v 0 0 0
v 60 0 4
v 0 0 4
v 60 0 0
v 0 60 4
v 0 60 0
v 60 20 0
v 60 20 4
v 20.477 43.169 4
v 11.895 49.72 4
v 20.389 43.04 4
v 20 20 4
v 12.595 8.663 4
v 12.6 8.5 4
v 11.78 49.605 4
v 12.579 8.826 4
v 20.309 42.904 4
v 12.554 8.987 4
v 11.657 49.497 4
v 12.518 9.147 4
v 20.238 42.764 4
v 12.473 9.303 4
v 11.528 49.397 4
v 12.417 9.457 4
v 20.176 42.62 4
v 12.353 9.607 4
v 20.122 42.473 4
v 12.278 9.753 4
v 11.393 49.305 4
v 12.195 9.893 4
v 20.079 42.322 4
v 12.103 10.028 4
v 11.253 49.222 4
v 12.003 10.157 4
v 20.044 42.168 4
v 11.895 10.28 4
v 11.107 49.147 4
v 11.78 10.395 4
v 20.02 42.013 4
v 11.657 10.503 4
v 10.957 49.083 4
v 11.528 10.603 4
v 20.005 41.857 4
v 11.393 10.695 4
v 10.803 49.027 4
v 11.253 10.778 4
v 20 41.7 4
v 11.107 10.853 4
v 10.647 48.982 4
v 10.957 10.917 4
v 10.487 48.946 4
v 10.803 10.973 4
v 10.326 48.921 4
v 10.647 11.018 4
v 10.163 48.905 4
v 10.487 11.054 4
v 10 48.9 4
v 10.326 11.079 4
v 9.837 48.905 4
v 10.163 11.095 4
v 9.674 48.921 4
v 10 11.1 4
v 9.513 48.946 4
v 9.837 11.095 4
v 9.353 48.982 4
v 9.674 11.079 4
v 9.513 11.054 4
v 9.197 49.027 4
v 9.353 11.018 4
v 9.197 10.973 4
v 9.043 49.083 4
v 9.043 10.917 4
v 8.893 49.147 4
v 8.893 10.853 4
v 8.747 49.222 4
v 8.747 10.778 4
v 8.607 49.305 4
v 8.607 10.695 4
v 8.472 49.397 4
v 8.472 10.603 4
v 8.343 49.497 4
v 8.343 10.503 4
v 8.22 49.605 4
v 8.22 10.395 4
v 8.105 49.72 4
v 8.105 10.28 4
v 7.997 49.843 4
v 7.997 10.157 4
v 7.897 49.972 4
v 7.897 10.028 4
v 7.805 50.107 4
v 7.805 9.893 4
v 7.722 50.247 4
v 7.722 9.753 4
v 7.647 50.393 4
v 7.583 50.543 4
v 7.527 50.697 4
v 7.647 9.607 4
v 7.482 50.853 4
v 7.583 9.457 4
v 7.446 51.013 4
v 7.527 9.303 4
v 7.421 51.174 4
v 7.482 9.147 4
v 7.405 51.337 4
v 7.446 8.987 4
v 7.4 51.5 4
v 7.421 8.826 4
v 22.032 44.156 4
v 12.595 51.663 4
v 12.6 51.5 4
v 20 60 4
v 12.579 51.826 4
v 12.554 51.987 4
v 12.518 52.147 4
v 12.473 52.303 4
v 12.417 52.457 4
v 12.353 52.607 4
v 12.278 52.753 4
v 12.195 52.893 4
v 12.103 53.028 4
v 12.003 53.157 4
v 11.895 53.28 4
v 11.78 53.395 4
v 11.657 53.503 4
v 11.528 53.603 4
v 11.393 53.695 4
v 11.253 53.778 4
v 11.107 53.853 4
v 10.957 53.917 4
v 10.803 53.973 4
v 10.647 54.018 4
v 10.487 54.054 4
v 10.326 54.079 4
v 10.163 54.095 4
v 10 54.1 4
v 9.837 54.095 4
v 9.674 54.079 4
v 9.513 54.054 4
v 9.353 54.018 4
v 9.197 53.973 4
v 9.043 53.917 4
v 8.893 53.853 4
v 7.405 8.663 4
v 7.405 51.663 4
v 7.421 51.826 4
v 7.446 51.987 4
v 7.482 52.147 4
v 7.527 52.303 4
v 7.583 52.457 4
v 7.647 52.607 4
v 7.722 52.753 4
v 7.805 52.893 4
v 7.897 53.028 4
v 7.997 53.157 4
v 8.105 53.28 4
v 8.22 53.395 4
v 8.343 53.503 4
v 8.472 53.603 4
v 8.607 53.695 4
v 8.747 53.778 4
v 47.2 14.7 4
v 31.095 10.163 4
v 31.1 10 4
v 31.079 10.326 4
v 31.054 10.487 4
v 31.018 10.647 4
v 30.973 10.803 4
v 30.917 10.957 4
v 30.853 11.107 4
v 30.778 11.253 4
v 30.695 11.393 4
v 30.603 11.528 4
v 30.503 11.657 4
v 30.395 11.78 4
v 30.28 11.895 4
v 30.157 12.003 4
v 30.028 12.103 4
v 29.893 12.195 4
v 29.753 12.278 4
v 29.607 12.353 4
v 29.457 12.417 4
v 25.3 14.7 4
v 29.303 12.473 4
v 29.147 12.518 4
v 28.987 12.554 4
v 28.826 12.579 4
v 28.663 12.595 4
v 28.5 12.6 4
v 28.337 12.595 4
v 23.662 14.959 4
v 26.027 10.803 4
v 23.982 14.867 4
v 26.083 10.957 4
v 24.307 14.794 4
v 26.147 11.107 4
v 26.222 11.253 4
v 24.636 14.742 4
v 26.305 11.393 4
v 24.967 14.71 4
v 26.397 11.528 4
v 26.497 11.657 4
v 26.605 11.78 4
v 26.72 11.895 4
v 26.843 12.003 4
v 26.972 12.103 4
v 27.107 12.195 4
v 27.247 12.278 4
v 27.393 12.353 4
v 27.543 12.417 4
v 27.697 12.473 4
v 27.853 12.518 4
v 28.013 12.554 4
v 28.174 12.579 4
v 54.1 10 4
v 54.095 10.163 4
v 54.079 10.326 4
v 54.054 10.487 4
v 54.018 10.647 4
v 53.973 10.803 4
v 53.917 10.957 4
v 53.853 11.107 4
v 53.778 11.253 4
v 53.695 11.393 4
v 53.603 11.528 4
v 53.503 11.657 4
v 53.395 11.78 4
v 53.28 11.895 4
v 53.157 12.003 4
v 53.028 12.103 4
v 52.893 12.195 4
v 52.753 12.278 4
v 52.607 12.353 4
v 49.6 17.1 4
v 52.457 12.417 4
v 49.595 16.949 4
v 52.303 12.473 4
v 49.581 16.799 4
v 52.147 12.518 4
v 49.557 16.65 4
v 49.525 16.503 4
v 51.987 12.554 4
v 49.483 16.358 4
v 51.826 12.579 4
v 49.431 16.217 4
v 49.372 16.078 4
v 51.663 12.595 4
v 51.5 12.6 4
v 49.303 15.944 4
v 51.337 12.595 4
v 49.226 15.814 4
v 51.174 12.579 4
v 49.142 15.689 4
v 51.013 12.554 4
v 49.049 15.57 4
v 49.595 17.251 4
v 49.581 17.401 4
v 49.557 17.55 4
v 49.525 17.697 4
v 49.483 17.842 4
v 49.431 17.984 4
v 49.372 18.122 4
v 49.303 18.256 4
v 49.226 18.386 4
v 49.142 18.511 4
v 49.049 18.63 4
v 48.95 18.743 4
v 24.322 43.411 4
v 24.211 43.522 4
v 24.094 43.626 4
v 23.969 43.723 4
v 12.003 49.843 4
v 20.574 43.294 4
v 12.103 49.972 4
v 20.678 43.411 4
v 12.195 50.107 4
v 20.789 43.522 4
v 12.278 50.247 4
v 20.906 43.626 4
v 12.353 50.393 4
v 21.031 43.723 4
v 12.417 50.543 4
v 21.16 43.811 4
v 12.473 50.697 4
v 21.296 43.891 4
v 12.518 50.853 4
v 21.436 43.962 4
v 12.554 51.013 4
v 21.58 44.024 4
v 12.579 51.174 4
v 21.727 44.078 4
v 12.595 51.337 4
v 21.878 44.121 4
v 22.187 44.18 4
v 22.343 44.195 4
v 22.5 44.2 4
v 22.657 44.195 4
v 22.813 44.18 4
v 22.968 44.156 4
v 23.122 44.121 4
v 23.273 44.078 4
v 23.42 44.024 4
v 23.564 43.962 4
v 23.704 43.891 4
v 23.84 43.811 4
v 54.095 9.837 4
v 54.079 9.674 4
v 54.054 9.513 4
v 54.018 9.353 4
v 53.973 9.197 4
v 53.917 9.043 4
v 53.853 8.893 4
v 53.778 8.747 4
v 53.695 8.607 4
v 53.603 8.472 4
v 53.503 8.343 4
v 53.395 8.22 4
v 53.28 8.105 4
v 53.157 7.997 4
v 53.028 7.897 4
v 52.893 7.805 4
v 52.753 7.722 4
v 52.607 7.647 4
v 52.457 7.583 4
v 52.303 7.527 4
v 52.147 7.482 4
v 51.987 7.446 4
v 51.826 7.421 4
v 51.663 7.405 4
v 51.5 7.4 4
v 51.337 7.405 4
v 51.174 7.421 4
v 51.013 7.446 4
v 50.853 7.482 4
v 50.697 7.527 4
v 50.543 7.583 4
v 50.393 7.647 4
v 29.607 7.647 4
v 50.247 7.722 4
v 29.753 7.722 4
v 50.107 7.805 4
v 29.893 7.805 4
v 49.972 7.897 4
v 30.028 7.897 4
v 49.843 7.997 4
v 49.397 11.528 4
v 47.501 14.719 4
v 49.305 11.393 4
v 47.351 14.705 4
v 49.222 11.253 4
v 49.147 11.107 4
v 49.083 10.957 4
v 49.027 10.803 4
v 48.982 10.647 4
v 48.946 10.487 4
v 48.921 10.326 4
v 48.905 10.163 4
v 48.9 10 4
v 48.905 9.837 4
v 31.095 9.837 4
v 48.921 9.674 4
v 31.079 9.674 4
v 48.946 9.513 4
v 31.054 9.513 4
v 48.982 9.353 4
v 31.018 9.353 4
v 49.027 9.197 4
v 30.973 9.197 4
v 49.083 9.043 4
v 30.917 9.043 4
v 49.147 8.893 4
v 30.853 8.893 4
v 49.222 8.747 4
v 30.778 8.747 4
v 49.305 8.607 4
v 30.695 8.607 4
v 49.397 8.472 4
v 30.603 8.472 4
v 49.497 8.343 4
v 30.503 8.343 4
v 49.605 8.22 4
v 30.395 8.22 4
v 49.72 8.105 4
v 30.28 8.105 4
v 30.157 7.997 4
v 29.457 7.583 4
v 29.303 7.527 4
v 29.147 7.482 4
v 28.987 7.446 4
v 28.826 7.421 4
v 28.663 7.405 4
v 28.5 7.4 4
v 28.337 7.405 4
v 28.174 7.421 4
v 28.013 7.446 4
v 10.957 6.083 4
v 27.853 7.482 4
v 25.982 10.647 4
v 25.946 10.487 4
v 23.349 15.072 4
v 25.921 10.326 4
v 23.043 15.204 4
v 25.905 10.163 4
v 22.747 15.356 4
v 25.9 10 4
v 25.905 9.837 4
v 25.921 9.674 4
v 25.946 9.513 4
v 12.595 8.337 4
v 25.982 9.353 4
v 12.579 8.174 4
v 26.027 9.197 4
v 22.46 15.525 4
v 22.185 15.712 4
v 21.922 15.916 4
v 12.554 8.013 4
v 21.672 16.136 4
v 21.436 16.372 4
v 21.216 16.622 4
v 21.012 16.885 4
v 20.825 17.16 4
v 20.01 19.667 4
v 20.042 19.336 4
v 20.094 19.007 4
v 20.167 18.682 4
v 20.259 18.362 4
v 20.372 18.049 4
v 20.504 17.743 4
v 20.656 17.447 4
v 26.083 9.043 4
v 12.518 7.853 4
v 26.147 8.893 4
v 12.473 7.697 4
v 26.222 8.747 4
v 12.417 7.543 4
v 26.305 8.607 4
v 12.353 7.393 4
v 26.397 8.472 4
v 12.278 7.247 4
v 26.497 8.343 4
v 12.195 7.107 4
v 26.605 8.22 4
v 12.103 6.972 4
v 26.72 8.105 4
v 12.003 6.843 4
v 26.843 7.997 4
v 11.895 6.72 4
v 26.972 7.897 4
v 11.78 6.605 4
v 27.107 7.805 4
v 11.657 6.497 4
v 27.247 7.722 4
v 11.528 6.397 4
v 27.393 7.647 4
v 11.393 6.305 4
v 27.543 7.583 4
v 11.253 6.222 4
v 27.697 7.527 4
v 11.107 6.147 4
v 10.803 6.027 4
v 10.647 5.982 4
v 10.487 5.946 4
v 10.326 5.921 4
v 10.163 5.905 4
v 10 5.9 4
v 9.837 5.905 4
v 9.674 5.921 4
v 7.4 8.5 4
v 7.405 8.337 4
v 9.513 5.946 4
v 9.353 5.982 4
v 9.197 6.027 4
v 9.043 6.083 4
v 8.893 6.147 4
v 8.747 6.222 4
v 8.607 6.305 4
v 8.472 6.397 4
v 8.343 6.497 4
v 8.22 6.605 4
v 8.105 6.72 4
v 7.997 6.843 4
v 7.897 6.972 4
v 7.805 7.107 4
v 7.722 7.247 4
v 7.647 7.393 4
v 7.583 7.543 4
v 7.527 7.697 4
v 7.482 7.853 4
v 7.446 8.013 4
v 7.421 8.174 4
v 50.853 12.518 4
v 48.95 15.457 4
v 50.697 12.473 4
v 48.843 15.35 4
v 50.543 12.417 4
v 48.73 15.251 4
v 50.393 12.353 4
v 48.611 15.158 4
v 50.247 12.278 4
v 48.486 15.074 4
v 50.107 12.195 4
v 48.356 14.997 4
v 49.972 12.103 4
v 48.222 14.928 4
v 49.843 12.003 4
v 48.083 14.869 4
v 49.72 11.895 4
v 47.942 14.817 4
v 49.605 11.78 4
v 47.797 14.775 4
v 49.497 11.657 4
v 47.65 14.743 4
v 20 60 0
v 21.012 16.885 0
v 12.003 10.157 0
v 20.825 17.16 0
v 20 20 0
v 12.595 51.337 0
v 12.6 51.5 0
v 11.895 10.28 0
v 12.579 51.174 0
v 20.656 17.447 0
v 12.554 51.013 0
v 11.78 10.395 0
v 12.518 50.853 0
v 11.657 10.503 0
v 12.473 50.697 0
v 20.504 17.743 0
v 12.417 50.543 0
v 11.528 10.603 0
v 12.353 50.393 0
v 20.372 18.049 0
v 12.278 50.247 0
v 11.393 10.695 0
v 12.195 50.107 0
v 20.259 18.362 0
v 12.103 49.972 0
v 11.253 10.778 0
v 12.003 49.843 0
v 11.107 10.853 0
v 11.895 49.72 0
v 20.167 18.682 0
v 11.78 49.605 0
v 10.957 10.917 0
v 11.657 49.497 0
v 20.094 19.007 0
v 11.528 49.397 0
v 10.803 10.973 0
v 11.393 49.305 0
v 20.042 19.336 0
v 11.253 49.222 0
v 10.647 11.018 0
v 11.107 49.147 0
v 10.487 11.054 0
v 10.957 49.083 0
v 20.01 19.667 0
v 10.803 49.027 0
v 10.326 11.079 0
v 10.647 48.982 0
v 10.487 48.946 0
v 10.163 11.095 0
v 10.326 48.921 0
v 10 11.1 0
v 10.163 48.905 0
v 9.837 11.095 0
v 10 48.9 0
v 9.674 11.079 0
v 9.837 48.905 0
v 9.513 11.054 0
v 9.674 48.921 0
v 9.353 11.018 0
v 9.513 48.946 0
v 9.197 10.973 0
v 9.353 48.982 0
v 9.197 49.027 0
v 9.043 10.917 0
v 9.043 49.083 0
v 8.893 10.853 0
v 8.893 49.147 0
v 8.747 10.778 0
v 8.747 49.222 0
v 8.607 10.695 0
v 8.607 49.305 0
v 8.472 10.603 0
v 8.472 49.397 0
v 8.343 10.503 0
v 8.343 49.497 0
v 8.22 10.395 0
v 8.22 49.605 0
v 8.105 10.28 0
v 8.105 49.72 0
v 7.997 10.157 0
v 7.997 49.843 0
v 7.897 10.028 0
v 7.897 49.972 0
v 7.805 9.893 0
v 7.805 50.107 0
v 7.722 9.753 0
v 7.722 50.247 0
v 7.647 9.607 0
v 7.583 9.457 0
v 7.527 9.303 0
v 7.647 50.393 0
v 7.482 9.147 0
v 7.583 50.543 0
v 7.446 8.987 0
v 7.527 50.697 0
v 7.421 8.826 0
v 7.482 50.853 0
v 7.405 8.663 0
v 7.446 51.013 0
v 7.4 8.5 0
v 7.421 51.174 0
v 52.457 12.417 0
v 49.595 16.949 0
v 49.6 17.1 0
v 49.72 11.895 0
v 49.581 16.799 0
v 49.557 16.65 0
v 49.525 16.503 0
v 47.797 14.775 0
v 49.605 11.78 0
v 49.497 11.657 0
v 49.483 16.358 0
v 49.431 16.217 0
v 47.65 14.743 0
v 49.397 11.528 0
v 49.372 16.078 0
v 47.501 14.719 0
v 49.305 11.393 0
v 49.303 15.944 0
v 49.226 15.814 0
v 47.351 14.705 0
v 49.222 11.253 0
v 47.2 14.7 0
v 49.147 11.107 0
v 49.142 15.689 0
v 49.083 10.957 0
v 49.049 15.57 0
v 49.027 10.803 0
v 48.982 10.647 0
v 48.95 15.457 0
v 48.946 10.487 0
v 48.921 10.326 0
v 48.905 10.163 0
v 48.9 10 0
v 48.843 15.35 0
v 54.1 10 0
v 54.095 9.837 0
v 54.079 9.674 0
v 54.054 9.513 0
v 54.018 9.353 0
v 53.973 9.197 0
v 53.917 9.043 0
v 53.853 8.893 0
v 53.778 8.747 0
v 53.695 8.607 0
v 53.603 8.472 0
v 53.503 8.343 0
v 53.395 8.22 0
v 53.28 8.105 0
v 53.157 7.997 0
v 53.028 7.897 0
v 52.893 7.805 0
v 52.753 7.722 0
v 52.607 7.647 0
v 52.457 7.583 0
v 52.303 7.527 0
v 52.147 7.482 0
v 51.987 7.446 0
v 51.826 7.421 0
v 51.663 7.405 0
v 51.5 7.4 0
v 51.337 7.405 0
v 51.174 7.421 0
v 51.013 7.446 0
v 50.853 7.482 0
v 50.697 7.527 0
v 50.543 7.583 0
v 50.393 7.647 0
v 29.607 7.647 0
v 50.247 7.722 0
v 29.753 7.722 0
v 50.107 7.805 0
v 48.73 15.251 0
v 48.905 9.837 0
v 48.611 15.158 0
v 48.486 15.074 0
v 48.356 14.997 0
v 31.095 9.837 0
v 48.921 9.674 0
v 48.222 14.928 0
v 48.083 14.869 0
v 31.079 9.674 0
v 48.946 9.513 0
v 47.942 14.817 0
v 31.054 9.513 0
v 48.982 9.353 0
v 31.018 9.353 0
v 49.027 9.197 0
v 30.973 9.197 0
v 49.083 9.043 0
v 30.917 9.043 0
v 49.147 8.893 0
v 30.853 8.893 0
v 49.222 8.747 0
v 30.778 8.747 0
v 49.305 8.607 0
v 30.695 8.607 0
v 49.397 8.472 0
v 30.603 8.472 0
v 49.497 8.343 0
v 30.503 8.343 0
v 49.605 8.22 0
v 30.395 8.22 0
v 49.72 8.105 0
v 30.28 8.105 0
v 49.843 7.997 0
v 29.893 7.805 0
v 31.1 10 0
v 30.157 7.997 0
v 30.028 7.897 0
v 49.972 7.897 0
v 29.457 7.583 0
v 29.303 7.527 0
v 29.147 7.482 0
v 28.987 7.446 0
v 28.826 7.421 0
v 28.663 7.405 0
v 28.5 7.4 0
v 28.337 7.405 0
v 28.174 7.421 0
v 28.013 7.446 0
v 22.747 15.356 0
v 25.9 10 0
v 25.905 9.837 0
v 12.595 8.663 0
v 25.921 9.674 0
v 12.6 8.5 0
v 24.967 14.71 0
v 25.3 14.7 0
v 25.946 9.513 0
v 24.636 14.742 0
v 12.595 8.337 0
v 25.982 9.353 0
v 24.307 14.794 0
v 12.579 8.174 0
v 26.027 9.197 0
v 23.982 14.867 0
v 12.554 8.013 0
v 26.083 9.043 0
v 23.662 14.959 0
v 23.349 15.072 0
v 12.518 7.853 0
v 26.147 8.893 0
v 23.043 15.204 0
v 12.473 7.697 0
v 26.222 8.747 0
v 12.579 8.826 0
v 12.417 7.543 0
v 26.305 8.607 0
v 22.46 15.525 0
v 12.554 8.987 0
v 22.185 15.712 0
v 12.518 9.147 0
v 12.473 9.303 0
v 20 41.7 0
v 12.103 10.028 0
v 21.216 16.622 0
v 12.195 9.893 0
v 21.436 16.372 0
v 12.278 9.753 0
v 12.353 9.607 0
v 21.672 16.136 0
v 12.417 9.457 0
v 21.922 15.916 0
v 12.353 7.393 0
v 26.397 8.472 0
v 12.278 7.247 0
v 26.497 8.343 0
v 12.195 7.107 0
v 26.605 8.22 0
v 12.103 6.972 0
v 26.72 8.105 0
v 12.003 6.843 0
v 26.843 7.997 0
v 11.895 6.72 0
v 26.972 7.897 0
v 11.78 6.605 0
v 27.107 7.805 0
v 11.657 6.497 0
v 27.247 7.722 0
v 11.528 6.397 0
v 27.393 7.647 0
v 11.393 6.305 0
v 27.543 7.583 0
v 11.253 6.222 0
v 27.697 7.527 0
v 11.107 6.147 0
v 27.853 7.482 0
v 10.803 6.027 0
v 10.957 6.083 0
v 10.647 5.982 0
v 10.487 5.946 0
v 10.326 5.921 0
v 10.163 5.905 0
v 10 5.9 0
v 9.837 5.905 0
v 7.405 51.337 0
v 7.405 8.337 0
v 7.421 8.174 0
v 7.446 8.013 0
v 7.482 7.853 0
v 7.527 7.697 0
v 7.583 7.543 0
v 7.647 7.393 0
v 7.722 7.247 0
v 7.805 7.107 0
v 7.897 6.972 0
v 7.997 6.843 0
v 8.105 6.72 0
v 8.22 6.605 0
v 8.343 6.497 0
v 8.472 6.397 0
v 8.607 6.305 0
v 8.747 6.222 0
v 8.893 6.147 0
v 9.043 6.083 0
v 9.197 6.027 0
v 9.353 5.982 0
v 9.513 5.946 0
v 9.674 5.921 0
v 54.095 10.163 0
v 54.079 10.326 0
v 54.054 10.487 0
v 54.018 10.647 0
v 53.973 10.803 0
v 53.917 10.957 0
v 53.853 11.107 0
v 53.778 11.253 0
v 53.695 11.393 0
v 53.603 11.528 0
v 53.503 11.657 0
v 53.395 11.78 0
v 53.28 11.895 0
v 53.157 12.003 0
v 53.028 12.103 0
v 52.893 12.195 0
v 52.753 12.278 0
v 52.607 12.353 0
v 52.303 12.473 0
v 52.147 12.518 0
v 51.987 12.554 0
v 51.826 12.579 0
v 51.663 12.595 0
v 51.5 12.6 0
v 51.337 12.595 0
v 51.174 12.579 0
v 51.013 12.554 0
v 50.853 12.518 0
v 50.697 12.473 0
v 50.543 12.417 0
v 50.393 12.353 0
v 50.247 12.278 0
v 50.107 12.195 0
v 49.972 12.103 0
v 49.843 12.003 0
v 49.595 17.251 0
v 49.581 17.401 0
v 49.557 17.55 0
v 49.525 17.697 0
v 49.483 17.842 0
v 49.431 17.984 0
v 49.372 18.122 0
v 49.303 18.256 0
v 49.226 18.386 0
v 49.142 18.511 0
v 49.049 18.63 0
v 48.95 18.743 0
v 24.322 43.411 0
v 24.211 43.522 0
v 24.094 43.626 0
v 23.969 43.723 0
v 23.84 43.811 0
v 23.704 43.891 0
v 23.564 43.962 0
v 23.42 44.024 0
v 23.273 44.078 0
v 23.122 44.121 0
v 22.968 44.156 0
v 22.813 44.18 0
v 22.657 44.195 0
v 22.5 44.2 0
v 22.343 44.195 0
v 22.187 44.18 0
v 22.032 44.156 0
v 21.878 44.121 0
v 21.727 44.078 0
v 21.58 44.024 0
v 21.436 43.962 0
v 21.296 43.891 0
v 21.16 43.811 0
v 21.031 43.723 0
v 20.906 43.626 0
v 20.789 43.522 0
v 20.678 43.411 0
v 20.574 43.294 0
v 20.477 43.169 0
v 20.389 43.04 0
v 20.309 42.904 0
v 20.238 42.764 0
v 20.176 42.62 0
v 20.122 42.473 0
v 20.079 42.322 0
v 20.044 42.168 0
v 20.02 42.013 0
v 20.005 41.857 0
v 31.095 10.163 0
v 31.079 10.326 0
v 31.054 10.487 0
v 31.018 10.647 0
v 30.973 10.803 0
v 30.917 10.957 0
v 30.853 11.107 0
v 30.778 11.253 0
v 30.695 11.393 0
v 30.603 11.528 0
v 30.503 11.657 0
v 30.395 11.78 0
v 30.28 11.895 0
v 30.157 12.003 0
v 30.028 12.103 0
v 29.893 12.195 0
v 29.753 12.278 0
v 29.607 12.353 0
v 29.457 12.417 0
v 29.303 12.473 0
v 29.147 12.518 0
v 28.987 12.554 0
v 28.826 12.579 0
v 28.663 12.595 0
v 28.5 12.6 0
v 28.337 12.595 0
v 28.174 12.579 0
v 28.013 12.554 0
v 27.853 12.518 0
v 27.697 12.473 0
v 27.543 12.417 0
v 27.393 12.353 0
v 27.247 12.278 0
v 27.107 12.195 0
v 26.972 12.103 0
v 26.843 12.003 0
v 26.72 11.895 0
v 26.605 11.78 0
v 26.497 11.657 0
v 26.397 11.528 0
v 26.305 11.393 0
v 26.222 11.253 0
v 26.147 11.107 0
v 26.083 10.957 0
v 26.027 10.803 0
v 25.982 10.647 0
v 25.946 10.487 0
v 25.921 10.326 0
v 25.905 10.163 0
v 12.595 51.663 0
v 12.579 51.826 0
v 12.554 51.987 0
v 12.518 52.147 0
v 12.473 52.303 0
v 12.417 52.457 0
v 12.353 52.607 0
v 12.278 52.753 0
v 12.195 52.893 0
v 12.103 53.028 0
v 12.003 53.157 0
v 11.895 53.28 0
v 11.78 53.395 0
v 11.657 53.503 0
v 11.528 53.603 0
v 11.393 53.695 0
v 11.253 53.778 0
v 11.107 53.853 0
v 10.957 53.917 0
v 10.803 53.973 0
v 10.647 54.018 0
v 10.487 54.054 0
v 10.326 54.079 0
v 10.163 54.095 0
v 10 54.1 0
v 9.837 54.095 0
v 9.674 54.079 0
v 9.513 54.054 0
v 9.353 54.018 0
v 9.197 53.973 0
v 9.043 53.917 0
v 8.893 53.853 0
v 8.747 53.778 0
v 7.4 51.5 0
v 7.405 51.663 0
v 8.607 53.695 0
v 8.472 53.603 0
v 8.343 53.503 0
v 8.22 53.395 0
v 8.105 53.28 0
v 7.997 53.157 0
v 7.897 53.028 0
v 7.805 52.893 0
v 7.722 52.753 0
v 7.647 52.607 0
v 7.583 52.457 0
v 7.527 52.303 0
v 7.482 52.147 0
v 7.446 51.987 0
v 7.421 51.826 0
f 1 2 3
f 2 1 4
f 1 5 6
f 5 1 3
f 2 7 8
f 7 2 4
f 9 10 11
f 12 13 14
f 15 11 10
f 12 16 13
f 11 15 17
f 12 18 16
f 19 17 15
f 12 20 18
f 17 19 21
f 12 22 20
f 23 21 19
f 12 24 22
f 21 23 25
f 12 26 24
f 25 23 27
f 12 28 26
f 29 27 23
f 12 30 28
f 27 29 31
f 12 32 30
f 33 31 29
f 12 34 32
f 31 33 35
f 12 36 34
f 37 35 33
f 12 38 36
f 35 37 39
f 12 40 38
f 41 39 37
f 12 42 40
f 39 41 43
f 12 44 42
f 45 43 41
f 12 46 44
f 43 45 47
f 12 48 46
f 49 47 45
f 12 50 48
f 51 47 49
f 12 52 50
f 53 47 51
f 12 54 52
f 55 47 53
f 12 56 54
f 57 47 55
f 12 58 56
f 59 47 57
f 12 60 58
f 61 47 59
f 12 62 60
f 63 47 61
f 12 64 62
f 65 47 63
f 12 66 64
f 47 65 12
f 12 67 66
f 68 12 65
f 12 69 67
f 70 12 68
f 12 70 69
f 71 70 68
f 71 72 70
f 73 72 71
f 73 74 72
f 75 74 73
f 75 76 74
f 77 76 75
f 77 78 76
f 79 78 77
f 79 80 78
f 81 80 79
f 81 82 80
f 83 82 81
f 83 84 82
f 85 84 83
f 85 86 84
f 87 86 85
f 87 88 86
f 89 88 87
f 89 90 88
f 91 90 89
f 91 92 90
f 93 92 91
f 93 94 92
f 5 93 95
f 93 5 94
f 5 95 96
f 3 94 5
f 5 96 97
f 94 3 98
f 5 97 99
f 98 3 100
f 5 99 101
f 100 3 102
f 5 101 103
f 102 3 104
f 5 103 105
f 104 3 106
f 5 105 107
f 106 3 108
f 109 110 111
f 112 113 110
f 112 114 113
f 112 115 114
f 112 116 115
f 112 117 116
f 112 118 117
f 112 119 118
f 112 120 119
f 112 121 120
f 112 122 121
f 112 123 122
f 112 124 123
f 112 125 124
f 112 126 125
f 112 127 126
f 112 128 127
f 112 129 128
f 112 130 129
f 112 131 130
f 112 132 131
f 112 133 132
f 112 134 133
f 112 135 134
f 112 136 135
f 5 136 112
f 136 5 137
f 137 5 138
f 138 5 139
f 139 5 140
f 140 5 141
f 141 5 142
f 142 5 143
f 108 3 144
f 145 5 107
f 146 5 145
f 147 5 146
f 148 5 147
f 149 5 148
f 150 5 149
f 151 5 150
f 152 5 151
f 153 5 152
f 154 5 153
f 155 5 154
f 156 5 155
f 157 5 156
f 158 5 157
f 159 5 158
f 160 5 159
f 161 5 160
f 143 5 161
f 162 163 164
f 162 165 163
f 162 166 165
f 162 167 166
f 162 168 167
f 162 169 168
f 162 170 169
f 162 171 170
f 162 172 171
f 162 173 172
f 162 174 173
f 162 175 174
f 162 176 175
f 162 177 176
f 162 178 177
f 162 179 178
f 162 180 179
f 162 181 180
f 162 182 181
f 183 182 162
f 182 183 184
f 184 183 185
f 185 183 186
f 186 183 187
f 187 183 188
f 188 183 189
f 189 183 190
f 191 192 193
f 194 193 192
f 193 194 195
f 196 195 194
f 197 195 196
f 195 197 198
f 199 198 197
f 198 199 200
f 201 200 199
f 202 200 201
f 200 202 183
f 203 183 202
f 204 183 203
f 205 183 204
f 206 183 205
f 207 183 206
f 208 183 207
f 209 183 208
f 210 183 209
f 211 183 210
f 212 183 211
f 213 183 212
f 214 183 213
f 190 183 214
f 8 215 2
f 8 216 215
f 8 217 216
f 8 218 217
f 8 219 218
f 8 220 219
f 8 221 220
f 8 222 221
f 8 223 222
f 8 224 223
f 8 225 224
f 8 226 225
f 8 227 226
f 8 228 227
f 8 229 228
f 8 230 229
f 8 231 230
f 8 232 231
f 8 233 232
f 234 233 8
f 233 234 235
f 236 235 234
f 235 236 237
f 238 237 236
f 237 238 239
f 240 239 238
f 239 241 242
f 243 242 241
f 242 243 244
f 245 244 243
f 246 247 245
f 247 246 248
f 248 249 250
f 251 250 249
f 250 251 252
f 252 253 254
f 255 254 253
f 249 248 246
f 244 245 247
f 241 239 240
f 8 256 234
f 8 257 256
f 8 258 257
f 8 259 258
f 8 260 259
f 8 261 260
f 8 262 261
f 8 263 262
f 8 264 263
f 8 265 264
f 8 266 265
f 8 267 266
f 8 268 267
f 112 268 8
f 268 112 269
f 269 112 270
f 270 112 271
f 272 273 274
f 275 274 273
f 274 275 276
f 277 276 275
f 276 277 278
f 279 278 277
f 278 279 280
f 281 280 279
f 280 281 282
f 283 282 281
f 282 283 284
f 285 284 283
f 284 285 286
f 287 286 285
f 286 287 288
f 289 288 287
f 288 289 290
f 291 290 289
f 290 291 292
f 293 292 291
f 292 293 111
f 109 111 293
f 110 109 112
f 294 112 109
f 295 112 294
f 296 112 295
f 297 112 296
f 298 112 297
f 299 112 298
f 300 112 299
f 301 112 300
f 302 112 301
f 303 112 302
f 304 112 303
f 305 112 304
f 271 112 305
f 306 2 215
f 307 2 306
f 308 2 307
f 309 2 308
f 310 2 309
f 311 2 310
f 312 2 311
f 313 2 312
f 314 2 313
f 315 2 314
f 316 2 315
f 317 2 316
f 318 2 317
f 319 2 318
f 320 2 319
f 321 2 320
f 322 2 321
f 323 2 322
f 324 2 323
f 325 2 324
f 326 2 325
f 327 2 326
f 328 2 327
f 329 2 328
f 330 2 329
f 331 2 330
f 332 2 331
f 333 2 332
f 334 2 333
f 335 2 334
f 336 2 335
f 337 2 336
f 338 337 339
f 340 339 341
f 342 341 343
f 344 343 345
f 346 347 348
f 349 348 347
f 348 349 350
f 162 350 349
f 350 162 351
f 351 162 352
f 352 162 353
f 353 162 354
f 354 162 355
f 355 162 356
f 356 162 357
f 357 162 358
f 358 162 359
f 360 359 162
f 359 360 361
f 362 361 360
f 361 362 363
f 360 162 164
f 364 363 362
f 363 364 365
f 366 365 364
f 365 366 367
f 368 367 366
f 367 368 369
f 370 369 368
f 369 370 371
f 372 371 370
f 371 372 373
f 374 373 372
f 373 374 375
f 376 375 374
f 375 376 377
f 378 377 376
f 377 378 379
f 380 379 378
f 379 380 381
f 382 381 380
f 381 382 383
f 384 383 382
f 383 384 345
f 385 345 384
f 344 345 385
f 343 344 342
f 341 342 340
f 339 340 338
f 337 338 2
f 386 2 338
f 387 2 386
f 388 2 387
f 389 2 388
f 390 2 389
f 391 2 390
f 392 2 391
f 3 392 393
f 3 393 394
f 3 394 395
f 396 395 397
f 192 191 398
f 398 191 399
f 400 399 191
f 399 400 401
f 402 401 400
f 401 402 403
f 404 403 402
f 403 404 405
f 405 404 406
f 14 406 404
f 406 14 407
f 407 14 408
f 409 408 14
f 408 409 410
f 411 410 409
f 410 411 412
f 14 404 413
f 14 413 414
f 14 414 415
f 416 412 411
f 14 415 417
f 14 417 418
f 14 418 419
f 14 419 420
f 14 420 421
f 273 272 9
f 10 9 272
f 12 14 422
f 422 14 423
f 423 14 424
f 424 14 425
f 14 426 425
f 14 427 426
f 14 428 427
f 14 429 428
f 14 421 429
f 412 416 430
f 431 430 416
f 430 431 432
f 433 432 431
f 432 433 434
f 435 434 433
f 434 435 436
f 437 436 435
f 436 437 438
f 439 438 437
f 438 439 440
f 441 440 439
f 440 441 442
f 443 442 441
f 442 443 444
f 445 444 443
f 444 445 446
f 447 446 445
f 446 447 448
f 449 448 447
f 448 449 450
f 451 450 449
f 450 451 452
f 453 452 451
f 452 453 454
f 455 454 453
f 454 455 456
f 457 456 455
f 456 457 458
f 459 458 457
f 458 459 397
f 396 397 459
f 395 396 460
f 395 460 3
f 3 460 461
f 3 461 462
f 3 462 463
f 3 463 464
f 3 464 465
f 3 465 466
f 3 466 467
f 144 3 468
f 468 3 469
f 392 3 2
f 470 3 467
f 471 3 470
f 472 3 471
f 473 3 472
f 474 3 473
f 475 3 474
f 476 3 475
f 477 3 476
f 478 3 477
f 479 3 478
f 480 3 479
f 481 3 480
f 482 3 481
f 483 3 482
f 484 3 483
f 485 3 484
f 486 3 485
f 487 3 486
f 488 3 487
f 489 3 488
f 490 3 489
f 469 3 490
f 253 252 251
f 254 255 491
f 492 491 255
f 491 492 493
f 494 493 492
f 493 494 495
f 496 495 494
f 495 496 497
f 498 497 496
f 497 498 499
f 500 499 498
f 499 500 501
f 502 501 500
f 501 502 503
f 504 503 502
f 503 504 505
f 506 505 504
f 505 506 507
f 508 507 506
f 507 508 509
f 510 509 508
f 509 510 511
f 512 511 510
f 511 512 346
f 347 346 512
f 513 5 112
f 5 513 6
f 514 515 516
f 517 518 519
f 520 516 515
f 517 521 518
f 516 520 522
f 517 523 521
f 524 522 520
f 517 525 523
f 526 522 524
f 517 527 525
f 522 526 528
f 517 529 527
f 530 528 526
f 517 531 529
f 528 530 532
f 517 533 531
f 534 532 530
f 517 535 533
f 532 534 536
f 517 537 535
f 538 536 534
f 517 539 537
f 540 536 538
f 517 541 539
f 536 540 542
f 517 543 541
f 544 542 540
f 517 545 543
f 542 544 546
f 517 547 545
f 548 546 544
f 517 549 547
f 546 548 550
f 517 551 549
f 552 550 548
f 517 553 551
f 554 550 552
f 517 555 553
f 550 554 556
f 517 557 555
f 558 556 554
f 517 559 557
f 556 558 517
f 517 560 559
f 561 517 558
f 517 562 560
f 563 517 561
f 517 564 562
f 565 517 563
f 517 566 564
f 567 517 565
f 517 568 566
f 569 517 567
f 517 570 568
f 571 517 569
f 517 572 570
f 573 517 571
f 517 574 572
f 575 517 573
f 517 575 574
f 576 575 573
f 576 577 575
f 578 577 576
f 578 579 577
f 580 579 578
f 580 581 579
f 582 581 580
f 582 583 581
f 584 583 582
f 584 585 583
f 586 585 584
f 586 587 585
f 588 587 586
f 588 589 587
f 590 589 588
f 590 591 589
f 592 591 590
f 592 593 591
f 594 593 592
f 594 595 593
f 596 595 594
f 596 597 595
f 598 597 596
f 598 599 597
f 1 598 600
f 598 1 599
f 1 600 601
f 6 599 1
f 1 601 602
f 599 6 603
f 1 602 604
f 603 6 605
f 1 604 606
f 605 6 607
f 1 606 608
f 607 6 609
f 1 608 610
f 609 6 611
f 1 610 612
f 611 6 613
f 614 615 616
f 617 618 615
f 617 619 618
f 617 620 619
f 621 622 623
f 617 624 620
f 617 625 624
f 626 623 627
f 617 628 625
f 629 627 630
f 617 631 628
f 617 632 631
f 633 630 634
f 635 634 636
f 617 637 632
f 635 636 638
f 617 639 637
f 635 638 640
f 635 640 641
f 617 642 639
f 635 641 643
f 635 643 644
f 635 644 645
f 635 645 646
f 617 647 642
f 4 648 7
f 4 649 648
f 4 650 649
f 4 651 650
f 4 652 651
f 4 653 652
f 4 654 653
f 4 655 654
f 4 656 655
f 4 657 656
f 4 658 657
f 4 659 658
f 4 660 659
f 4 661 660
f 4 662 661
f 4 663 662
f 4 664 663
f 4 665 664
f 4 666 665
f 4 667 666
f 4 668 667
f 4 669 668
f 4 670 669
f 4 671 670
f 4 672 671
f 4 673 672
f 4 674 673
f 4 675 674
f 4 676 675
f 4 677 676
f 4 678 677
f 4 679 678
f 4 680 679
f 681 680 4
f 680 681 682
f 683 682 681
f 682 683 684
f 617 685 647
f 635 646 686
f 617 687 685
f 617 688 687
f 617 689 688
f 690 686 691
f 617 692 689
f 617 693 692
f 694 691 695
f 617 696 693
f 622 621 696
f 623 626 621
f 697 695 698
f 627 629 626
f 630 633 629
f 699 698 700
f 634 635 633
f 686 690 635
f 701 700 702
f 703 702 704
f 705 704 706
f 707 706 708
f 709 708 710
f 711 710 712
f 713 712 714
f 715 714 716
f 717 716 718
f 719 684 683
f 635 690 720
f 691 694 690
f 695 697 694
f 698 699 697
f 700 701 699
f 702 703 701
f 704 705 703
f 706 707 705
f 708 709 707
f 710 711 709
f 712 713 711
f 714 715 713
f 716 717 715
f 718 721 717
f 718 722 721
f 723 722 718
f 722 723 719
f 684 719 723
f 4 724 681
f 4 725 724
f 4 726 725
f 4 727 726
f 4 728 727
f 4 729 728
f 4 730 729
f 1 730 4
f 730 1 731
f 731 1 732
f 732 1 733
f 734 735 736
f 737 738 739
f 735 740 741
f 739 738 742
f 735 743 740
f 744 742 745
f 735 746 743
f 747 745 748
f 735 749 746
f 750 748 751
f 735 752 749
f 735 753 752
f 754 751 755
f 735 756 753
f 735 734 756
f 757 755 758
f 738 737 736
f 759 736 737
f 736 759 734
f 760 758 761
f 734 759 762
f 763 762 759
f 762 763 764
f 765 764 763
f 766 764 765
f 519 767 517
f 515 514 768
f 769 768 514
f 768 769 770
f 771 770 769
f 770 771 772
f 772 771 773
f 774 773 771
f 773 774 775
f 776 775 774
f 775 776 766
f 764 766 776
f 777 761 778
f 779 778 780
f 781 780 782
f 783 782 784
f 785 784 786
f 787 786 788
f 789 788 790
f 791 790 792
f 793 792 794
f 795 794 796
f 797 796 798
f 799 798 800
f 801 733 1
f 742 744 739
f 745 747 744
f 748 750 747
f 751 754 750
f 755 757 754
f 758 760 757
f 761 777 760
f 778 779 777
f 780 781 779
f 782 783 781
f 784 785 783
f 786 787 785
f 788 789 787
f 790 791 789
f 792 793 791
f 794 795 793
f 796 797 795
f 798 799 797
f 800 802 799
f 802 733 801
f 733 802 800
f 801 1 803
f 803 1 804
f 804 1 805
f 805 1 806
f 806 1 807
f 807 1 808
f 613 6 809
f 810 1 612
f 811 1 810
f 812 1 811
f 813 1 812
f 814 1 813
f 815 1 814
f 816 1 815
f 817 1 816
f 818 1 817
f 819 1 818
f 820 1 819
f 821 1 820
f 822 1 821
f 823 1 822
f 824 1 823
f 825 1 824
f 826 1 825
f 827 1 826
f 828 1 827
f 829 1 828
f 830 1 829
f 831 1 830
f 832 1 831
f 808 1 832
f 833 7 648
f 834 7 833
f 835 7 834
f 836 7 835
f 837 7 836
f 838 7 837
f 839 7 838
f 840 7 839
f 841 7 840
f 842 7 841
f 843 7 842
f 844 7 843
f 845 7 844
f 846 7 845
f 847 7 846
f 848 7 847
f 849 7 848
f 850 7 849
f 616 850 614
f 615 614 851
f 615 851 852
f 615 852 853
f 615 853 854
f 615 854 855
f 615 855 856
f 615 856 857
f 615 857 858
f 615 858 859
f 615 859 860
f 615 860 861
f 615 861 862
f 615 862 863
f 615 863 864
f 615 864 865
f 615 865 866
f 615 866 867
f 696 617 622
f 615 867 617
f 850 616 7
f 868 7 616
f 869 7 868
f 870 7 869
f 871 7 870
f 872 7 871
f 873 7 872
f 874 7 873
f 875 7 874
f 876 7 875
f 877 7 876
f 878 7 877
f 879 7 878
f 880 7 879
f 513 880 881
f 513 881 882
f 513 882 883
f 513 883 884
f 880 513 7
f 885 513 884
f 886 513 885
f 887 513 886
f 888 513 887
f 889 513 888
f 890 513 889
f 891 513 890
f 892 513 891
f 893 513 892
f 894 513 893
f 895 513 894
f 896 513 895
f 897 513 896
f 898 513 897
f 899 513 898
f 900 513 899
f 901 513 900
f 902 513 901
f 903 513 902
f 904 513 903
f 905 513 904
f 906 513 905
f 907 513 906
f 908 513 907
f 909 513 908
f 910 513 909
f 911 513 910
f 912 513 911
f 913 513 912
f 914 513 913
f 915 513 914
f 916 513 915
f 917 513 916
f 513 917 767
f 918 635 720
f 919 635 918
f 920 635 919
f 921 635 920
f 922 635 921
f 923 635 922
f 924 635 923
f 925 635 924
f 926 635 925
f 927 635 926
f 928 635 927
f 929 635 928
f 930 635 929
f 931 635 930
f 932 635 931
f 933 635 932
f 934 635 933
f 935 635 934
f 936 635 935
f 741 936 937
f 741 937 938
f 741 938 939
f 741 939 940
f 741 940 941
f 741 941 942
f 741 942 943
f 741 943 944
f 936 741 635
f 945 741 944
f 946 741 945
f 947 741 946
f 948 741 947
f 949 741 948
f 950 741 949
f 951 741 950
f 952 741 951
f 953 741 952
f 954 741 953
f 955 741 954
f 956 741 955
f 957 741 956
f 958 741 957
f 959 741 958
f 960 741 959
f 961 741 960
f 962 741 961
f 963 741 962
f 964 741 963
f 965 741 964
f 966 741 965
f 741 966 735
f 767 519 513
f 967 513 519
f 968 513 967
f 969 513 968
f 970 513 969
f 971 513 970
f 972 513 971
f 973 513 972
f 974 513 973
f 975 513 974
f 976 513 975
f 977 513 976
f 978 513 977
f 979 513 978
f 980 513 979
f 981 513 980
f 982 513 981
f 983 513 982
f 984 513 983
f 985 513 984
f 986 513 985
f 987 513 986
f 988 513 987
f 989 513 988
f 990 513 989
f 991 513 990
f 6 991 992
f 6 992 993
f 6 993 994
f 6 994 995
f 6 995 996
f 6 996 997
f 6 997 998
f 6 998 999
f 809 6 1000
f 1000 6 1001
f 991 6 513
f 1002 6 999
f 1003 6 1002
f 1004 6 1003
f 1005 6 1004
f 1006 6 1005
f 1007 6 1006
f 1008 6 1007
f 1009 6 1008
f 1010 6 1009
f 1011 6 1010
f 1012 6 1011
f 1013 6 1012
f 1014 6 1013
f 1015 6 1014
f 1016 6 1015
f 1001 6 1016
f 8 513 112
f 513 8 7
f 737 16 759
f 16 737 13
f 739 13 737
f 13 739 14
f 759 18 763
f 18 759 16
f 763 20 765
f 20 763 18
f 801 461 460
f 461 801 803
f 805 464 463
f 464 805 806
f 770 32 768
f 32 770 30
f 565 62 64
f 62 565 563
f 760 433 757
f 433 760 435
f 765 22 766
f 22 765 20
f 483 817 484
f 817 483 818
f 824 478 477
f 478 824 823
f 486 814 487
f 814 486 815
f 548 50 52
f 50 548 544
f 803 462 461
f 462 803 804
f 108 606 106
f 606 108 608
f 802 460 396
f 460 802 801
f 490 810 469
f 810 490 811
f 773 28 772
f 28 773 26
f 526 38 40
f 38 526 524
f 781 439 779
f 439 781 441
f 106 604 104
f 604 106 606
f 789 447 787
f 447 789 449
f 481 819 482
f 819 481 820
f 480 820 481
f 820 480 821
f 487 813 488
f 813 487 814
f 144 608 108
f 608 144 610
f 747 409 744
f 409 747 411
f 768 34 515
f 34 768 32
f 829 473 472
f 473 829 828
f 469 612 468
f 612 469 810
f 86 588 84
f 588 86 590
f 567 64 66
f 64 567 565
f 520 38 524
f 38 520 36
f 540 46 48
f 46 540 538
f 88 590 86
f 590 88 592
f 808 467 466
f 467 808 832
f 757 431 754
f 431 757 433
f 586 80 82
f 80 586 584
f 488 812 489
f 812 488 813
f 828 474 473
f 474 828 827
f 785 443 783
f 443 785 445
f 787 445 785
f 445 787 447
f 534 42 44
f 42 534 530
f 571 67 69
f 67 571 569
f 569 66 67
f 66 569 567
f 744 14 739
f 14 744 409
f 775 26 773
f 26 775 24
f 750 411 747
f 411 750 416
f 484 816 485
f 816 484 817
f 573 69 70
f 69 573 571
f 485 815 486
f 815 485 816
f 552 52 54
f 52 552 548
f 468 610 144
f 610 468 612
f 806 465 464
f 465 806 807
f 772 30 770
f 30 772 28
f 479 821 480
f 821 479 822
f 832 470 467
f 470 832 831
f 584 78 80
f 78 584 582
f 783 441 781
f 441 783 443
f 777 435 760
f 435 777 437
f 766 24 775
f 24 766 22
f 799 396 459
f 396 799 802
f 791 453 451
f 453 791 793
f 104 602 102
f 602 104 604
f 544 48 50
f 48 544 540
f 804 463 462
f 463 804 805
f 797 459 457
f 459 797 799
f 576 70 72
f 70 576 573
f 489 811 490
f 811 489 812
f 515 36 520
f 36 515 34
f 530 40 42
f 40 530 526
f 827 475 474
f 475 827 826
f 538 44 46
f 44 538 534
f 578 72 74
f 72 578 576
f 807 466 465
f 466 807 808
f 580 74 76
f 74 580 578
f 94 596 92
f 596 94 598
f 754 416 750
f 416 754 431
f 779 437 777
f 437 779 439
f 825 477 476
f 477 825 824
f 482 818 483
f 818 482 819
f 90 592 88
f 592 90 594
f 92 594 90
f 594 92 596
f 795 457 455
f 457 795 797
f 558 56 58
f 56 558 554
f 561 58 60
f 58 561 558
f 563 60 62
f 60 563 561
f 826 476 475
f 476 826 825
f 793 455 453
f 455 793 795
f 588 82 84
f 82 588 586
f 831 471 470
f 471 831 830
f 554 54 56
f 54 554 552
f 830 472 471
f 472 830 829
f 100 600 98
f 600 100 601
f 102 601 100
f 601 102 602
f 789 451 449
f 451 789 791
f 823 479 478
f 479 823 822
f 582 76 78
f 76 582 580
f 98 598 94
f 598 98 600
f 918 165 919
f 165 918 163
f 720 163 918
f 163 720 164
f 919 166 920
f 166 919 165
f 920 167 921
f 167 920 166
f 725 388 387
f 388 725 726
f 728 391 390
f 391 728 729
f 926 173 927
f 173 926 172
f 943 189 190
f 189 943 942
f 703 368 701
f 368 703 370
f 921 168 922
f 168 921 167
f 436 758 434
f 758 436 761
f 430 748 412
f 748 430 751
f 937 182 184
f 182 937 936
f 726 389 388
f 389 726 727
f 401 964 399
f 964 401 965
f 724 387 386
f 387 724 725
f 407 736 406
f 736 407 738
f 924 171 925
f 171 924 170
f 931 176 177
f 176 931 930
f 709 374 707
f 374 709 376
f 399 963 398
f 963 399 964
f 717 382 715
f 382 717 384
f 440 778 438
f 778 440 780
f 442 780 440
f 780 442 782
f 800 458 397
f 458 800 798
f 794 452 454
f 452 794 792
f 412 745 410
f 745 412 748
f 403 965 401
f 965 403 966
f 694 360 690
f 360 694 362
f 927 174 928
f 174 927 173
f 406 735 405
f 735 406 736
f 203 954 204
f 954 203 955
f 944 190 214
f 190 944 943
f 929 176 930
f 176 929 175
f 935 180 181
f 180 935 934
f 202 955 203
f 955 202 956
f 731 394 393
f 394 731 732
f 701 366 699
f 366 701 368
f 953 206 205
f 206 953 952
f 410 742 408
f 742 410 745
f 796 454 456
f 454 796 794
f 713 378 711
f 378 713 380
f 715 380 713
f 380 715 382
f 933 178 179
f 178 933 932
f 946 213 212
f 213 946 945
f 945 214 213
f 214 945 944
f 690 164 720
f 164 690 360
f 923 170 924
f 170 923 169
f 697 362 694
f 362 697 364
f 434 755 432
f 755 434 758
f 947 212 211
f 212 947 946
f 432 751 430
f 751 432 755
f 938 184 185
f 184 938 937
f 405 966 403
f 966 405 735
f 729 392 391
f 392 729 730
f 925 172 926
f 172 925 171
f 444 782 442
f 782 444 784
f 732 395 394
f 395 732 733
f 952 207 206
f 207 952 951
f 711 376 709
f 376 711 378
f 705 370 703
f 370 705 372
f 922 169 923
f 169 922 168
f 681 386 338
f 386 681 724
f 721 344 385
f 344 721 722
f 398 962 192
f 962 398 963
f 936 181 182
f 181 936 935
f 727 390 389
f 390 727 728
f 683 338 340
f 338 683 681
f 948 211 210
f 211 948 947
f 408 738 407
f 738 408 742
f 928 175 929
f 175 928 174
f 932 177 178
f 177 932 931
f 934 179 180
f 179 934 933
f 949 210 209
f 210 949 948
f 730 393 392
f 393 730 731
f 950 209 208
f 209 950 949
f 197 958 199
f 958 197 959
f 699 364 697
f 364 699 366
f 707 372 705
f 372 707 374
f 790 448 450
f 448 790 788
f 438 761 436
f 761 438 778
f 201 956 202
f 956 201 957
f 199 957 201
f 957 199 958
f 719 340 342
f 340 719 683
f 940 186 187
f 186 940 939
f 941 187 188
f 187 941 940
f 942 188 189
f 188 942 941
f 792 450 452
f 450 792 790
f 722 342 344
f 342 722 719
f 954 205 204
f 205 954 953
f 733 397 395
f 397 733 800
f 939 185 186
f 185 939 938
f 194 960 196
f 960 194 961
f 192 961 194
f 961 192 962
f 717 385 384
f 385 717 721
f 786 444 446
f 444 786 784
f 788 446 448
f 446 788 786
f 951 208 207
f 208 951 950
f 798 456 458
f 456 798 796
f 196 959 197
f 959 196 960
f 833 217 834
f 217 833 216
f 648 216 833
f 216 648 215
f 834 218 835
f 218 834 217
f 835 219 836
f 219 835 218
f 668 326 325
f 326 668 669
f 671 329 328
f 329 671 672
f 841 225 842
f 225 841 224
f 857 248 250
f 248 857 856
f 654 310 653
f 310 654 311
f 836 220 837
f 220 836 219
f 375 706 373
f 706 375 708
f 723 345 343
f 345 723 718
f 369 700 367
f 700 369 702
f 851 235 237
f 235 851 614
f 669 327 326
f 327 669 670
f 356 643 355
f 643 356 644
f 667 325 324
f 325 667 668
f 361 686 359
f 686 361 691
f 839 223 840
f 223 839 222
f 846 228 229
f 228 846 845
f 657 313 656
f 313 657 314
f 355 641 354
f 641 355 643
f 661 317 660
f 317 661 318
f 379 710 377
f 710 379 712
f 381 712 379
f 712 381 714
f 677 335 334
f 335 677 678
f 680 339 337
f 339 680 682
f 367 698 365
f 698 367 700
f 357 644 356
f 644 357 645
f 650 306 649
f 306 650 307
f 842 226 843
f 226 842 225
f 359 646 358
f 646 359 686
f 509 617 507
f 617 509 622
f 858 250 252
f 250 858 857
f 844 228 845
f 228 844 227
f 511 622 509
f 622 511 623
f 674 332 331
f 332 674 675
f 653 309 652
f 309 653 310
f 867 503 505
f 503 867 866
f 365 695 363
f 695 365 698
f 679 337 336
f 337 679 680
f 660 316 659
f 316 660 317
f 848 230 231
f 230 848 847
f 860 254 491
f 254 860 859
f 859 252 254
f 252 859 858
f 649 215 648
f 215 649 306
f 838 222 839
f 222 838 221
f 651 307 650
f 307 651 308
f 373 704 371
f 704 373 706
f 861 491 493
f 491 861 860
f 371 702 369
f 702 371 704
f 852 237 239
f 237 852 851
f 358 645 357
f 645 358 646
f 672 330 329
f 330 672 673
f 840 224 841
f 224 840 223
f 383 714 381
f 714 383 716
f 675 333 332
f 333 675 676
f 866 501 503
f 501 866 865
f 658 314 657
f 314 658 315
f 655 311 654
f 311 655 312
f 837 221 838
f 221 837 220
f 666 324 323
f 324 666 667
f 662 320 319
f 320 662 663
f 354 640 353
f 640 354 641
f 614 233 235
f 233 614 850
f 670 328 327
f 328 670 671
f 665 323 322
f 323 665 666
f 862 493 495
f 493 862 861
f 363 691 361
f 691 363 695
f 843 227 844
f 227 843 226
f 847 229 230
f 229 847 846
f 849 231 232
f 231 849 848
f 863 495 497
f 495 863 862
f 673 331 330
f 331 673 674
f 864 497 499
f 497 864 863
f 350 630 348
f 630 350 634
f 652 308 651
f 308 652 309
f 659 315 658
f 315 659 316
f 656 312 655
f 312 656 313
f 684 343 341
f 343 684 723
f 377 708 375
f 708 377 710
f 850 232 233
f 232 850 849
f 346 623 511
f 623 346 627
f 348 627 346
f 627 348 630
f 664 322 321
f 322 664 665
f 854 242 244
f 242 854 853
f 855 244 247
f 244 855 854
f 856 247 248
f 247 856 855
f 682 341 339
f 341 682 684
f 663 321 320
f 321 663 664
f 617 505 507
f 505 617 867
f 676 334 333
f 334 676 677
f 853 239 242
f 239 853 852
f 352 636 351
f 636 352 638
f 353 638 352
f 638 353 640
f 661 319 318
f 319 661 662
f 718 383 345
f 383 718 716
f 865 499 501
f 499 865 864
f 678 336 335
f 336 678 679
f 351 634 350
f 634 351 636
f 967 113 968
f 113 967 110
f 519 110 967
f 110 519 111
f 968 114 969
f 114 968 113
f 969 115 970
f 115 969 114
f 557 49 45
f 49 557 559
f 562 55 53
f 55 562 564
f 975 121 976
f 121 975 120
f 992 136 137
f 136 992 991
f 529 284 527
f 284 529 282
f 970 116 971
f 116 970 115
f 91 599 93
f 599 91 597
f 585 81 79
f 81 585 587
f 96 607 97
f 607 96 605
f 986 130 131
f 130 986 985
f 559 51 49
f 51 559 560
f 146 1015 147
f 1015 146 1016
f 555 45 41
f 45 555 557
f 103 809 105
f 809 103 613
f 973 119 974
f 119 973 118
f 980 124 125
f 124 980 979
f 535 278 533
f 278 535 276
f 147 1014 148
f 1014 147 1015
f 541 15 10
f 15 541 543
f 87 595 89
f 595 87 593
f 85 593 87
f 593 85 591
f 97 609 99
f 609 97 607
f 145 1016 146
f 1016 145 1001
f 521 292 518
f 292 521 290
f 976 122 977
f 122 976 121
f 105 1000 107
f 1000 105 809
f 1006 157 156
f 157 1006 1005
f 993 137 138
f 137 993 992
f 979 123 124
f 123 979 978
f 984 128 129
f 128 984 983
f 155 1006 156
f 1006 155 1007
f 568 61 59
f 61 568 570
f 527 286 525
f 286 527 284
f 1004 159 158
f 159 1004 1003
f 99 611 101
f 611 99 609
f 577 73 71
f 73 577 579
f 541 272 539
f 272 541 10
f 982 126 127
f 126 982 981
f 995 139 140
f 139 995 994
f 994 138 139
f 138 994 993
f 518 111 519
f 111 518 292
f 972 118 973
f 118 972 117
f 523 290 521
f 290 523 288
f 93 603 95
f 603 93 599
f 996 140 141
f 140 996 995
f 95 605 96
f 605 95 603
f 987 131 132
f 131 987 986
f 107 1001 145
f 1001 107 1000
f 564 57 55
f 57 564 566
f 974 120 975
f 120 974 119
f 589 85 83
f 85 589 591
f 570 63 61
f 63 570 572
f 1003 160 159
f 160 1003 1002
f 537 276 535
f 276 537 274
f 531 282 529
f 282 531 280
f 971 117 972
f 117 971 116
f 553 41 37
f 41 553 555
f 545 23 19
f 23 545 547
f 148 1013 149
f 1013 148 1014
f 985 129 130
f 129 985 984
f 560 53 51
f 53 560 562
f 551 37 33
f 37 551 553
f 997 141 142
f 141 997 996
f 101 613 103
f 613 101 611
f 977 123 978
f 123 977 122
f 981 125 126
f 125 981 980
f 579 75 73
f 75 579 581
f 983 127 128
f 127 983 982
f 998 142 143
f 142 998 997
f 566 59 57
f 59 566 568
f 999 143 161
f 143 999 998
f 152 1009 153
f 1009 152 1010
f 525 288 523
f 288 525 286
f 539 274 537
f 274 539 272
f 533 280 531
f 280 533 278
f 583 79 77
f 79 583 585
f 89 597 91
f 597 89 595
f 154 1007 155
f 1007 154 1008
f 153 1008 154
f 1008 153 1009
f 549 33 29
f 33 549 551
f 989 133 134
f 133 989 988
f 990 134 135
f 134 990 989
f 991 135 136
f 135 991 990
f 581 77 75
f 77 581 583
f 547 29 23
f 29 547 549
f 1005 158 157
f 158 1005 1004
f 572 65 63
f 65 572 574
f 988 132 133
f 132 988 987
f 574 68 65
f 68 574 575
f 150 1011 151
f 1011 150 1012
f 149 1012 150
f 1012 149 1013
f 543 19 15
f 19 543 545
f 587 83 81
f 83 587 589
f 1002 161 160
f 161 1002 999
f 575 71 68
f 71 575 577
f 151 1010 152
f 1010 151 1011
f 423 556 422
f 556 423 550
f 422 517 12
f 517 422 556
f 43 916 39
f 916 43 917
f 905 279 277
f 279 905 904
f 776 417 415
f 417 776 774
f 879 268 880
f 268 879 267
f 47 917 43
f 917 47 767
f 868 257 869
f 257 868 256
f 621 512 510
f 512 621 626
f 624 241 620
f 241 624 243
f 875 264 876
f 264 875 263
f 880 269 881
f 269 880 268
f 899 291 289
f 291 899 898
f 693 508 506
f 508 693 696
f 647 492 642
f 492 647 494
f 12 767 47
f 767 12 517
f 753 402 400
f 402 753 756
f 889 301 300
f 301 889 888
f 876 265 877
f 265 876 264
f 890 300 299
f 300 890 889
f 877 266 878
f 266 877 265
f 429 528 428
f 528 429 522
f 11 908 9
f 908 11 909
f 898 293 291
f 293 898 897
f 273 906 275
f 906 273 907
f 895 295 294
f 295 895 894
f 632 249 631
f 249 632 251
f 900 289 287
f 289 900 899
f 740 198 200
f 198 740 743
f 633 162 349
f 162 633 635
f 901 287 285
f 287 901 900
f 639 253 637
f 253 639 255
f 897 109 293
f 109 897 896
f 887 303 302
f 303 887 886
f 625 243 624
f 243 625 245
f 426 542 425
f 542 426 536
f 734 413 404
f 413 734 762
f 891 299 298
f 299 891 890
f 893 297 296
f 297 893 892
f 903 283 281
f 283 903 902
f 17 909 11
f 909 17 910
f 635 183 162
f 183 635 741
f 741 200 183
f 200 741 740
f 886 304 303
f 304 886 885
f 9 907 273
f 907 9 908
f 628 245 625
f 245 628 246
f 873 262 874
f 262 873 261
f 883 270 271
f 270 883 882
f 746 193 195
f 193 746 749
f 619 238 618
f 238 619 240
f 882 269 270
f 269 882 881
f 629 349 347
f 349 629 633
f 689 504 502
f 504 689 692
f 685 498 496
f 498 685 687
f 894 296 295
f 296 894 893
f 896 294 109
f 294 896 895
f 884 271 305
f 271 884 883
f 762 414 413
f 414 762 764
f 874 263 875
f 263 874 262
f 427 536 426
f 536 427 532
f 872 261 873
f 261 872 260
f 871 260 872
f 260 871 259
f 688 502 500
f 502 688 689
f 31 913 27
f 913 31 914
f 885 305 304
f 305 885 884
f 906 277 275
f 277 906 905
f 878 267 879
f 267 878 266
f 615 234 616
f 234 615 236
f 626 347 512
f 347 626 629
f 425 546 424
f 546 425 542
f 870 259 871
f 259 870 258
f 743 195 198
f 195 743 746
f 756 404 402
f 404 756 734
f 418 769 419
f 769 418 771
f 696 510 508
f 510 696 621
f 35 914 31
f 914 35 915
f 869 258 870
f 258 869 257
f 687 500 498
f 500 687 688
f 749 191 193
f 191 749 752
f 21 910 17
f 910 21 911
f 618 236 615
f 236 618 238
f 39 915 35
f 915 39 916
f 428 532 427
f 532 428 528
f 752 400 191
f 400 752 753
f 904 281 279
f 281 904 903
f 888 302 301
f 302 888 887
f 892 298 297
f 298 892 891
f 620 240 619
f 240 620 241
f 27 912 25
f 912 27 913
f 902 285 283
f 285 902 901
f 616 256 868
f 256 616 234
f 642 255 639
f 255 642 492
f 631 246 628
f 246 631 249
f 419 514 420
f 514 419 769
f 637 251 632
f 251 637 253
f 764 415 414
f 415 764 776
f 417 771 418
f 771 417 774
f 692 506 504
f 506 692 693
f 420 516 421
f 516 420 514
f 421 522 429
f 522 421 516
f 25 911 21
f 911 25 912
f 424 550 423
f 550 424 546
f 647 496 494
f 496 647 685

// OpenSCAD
// file: functions.scad
/**********************************
	File: functions.scad
	Revision: 0.1 (10/7/2012)
	OpenSCAD version by:
	Michael Williams (gannon)
	mswillia@mtu.edu
**********************************/
include <config.scad>

//Drill a hole the given depth at the given location
module drill(x,y,radius,depth) {
	translate([x,y,-overdrill])
		cylinder(r=radius,h=depth,$fn=100);
}

module roundedcorner(radius,thickness,angle) {
	rotate([0,0,angle])
		translate([-radius+overdrill,-radius+overdrill,-overdrill])
			difference() {
				translate([-overdrill,-overdrill,0])
					cube([radius+overdrill,radius+overdrill,thickness+overdrill*2]);
				cylinder(r=radius,h=thickness+overdrill*2);
			}
}

//Usage: points is an array consisting of elements
//[x,y,r] for each point of the polygon
//Please note that x and y will be the centers
//of the rounded edges! Outside wall will be
//r away at some angle.
//Ideally I will make a function that will find
//the place to put the circle of a given radius
//based off of the points in the polygon.
module multiradiusroundedpoly(points,height) {
	linear_extrude(height=height)
		hull()
			for (p = points) {
				translate([p[0],p[1],0])
					circle(r=p[2],$fn=100);
			}
}
// file: config.scad
/**********************************
	File: config.scad
	Revision: 0.1 (10/7/2012)
	OpenSCAD version by:
	Michael Williams (gannon)
	mswillia@mtu.edu
**********************************/

/**********************************
		CONFIGURATION
**********************************/
//This is for the depth of holes so OpenSCAD renders correctly.
overdrill=0.1;

//Eventually group configurations into here. Maybe auto config for metric vs SAE components?

/**********************************
		END CONFIGURATION
**********************************/
// main file
/**********************************
	File: frameconnecters.scad
	Revision: 0.2 (10/7/2012)
	OpenSCAD version by:
	Michael Williams (gannon)
	mswillia@mtu.edu
**********************************/
include <config.scad>
use <functions.scad>
/**********************************
		CONFIGURATION
**********************************/
//Base size
side=60;
flat=20;
thickness=4;

//Holes
radius=2.6;

/**********************************
		END CONFIGURATION
**********************************/
union() {
	//Make our base unit
	difference() {
		linear_extrude(height=thickness)
			polygon(points=[[0,0],[side,0],[side,flat],[flat,side],[0,side]]);

		//Drill the hole
		drill(flat/2,8.5,radius,thickness+overdrill*2);
		drill(flat+8.5,flat/2,radius,thickness+overdrill*2);
		drill(side-8.5,flat/2,radius,thickness+overdrill*2);
		drill(flat/2,side-8.5,radius,thickness+overdrill*2);

		translate([flat+5.3,flat,-overdrill])
			multiradiusroundedpoly([[0,0,5.3],[2.5-5.3,21.7,2.5],[21.9,2.4-5.3,2.4]],thickness+overdrill*2);
	}
}
